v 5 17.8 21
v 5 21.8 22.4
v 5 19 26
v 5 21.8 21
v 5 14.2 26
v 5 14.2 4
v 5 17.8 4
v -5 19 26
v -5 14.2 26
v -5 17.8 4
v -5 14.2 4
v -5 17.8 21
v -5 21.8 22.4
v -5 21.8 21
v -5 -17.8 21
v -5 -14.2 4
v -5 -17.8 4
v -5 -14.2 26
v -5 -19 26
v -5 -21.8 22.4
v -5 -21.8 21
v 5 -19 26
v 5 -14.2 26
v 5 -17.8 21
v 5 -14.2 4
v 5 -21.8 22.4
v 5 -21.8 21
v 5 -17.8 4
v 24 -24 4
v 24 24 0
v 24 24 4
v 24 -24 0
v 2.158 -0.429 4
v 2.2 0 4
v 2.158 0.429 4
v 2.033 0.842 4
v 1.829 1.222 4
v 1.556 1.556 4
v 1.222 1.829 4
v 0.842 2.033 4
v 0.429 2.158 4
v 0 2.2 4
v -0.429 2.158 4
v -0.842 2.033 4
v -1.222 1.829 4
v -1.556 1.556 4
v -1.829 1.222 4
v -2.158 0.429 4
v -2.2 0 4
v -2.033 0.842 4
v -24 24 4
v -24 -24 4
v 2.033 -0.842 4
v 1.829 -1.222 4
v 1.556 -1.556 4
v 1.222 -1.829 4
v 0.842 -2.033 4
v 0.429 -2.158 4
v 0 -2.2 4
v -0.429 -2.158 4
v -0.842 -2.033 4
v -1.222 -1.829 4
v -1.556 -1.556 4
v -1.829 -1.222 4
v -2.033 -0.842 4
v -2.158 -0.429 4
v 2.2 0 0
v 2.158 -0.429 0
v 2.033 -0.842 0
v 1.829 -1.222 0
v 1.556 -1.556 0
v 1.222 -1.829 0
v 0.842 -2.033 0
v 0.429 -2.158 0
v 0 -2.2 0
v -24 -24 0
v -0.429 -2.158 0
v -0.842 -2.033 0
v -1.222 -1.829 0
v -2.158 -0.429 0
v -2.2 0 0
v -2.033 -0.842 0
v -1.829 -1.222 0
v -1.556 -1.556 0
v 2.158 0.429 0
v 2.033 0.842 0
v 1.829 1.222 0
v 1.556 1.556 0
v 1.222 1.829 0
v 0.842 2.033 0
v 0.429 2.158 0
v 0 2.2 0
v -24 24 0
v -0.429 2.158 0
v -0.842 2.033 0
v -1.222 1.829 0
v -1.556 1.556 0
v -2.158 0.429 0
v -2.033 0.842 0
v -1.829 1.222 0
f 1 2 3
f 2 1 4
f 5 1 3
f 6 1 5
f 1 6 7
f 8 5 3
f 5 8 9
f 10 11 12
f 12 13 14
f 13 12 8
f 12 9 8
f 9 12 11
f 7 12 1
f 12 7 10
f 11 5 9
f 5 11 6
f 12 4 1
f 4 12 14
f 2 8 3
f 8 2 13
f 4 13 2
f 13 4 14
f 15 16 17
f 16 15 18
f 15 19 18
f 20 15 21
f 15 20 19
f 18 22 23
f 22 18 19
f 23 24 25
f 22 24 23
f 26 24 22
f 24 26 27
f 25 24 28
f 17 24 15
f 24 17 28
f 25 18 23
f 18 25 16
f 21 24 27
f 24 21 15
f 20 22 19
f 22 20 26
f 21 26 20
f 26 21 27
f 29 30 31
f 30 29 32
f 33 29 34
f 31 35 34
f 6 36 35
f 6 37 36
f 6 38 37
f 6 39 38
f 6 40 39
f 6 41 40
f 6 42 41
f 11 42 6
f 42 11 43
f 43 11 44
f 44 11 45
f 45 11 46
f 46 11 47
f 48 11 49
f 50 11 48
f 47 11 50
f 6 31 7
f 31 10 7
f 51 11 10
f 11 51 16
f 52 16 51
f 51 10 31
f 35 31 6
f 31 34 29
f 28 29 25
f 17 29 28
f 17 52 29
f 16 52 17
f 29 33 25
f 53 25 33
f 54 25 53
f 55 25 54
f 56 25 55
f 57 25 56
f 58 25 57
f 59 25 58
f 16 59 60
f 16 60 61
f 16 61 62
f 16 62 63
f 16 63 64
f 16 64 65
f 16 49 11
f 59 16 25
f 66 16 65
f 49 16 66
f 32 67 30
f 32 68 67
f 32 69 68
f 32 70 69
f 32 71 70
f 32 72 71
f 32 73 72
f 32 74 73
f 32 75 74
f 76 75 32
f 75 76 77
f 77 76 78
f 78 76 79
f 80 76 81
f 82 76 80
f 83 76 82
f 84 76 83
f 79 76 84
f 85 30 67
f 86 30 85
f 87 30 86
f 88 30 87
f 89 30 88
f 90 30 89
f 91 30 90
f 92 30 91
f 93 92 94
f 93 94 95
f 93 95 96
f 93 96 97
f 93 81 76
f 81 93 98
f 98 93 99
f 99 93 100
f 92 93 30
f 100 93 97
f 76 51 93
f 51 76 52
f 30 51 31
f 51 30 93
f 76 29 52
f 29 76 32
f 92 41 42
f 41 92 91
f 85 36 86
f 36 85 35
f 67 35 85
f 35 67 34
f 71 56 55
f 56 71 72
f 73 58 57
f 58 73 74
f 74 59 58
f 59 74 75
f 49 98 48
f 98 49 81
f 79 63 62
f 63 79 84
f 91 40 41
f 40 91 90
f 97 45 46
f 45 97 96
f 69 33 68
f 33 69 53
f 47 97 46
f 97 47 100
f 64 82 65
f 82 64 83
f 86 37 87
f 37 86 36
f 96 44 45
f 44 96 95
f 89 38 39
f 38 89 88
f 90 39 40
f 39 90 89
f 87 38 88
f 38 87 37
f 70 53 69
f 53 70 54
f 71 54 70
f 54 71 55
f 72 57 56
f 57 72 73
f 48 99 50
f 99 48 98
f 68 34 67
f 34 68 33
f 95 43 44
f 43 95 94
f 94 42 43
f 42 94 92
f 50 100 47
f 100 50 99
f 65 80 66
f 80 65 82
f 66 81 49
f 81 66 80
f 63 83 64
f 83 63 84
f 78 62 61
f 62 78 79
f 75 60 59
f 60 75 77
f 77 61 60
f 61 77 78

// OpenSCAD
$fn = 32;

// ----------------------------------------------------------------------
// Snap-fit latch: 2 arms, 22 mm tall, 4.2 mm undercut hooks
// ----------------------------------------------------------------------

// --- parameters (mm) ---
base_d = 48;              // base plate depth
base_h = 4;               // base plate thickness
span = 32;                // distance between opposite arms
arm_t = 3.6;              // arm thickness
arm_d = 10;               // arm width
height = 22;              // free arm length
head_len = 4.2;           // hook reach
head_h = 5;               // hook height
lead = 1.4;               // lead-in ramp thickness
bore_d = 4.4;             // base fixing bore
top_z = 26;               // height of the arm tips above the base

arms = 2;

difference() {
  union() {
    /* base plate, centred on the arm ring */
    translate([-24, -24, 0]) cube([base_d, base_d, base_h]);
    for (a = [0 : 360 / arms : 359]) rotate([0, 0, a]) {
    /* arm, sunk 0.5 mm into the base */
    translate([-arm_d / 2, span / 2 - arm_t / 2, base_h - 0.5]) cube([arm_d, arm_t, height + 0.5]);
    /* hook: a convex hull of a tall inner block and a thin outer lip
       gives a flat undercut below and a lead-in ramp on top */
    hull() {
      translate([-arm_d / 2, span / 2 + arm_t / 2 - 0.6, top_z - head_h]) cube([arm_d, lead + 0.4, head_h]);
      translate([-arm_d / 2, span / 2 + arm_t / 2 - 0.2, top_z - head_h]) cube([arm_d, head_len, lead]);
    }
    }
  }
  translate([0, 0, -2.5]) cylinder(h = base_h + 5, d = bore_d);
}
